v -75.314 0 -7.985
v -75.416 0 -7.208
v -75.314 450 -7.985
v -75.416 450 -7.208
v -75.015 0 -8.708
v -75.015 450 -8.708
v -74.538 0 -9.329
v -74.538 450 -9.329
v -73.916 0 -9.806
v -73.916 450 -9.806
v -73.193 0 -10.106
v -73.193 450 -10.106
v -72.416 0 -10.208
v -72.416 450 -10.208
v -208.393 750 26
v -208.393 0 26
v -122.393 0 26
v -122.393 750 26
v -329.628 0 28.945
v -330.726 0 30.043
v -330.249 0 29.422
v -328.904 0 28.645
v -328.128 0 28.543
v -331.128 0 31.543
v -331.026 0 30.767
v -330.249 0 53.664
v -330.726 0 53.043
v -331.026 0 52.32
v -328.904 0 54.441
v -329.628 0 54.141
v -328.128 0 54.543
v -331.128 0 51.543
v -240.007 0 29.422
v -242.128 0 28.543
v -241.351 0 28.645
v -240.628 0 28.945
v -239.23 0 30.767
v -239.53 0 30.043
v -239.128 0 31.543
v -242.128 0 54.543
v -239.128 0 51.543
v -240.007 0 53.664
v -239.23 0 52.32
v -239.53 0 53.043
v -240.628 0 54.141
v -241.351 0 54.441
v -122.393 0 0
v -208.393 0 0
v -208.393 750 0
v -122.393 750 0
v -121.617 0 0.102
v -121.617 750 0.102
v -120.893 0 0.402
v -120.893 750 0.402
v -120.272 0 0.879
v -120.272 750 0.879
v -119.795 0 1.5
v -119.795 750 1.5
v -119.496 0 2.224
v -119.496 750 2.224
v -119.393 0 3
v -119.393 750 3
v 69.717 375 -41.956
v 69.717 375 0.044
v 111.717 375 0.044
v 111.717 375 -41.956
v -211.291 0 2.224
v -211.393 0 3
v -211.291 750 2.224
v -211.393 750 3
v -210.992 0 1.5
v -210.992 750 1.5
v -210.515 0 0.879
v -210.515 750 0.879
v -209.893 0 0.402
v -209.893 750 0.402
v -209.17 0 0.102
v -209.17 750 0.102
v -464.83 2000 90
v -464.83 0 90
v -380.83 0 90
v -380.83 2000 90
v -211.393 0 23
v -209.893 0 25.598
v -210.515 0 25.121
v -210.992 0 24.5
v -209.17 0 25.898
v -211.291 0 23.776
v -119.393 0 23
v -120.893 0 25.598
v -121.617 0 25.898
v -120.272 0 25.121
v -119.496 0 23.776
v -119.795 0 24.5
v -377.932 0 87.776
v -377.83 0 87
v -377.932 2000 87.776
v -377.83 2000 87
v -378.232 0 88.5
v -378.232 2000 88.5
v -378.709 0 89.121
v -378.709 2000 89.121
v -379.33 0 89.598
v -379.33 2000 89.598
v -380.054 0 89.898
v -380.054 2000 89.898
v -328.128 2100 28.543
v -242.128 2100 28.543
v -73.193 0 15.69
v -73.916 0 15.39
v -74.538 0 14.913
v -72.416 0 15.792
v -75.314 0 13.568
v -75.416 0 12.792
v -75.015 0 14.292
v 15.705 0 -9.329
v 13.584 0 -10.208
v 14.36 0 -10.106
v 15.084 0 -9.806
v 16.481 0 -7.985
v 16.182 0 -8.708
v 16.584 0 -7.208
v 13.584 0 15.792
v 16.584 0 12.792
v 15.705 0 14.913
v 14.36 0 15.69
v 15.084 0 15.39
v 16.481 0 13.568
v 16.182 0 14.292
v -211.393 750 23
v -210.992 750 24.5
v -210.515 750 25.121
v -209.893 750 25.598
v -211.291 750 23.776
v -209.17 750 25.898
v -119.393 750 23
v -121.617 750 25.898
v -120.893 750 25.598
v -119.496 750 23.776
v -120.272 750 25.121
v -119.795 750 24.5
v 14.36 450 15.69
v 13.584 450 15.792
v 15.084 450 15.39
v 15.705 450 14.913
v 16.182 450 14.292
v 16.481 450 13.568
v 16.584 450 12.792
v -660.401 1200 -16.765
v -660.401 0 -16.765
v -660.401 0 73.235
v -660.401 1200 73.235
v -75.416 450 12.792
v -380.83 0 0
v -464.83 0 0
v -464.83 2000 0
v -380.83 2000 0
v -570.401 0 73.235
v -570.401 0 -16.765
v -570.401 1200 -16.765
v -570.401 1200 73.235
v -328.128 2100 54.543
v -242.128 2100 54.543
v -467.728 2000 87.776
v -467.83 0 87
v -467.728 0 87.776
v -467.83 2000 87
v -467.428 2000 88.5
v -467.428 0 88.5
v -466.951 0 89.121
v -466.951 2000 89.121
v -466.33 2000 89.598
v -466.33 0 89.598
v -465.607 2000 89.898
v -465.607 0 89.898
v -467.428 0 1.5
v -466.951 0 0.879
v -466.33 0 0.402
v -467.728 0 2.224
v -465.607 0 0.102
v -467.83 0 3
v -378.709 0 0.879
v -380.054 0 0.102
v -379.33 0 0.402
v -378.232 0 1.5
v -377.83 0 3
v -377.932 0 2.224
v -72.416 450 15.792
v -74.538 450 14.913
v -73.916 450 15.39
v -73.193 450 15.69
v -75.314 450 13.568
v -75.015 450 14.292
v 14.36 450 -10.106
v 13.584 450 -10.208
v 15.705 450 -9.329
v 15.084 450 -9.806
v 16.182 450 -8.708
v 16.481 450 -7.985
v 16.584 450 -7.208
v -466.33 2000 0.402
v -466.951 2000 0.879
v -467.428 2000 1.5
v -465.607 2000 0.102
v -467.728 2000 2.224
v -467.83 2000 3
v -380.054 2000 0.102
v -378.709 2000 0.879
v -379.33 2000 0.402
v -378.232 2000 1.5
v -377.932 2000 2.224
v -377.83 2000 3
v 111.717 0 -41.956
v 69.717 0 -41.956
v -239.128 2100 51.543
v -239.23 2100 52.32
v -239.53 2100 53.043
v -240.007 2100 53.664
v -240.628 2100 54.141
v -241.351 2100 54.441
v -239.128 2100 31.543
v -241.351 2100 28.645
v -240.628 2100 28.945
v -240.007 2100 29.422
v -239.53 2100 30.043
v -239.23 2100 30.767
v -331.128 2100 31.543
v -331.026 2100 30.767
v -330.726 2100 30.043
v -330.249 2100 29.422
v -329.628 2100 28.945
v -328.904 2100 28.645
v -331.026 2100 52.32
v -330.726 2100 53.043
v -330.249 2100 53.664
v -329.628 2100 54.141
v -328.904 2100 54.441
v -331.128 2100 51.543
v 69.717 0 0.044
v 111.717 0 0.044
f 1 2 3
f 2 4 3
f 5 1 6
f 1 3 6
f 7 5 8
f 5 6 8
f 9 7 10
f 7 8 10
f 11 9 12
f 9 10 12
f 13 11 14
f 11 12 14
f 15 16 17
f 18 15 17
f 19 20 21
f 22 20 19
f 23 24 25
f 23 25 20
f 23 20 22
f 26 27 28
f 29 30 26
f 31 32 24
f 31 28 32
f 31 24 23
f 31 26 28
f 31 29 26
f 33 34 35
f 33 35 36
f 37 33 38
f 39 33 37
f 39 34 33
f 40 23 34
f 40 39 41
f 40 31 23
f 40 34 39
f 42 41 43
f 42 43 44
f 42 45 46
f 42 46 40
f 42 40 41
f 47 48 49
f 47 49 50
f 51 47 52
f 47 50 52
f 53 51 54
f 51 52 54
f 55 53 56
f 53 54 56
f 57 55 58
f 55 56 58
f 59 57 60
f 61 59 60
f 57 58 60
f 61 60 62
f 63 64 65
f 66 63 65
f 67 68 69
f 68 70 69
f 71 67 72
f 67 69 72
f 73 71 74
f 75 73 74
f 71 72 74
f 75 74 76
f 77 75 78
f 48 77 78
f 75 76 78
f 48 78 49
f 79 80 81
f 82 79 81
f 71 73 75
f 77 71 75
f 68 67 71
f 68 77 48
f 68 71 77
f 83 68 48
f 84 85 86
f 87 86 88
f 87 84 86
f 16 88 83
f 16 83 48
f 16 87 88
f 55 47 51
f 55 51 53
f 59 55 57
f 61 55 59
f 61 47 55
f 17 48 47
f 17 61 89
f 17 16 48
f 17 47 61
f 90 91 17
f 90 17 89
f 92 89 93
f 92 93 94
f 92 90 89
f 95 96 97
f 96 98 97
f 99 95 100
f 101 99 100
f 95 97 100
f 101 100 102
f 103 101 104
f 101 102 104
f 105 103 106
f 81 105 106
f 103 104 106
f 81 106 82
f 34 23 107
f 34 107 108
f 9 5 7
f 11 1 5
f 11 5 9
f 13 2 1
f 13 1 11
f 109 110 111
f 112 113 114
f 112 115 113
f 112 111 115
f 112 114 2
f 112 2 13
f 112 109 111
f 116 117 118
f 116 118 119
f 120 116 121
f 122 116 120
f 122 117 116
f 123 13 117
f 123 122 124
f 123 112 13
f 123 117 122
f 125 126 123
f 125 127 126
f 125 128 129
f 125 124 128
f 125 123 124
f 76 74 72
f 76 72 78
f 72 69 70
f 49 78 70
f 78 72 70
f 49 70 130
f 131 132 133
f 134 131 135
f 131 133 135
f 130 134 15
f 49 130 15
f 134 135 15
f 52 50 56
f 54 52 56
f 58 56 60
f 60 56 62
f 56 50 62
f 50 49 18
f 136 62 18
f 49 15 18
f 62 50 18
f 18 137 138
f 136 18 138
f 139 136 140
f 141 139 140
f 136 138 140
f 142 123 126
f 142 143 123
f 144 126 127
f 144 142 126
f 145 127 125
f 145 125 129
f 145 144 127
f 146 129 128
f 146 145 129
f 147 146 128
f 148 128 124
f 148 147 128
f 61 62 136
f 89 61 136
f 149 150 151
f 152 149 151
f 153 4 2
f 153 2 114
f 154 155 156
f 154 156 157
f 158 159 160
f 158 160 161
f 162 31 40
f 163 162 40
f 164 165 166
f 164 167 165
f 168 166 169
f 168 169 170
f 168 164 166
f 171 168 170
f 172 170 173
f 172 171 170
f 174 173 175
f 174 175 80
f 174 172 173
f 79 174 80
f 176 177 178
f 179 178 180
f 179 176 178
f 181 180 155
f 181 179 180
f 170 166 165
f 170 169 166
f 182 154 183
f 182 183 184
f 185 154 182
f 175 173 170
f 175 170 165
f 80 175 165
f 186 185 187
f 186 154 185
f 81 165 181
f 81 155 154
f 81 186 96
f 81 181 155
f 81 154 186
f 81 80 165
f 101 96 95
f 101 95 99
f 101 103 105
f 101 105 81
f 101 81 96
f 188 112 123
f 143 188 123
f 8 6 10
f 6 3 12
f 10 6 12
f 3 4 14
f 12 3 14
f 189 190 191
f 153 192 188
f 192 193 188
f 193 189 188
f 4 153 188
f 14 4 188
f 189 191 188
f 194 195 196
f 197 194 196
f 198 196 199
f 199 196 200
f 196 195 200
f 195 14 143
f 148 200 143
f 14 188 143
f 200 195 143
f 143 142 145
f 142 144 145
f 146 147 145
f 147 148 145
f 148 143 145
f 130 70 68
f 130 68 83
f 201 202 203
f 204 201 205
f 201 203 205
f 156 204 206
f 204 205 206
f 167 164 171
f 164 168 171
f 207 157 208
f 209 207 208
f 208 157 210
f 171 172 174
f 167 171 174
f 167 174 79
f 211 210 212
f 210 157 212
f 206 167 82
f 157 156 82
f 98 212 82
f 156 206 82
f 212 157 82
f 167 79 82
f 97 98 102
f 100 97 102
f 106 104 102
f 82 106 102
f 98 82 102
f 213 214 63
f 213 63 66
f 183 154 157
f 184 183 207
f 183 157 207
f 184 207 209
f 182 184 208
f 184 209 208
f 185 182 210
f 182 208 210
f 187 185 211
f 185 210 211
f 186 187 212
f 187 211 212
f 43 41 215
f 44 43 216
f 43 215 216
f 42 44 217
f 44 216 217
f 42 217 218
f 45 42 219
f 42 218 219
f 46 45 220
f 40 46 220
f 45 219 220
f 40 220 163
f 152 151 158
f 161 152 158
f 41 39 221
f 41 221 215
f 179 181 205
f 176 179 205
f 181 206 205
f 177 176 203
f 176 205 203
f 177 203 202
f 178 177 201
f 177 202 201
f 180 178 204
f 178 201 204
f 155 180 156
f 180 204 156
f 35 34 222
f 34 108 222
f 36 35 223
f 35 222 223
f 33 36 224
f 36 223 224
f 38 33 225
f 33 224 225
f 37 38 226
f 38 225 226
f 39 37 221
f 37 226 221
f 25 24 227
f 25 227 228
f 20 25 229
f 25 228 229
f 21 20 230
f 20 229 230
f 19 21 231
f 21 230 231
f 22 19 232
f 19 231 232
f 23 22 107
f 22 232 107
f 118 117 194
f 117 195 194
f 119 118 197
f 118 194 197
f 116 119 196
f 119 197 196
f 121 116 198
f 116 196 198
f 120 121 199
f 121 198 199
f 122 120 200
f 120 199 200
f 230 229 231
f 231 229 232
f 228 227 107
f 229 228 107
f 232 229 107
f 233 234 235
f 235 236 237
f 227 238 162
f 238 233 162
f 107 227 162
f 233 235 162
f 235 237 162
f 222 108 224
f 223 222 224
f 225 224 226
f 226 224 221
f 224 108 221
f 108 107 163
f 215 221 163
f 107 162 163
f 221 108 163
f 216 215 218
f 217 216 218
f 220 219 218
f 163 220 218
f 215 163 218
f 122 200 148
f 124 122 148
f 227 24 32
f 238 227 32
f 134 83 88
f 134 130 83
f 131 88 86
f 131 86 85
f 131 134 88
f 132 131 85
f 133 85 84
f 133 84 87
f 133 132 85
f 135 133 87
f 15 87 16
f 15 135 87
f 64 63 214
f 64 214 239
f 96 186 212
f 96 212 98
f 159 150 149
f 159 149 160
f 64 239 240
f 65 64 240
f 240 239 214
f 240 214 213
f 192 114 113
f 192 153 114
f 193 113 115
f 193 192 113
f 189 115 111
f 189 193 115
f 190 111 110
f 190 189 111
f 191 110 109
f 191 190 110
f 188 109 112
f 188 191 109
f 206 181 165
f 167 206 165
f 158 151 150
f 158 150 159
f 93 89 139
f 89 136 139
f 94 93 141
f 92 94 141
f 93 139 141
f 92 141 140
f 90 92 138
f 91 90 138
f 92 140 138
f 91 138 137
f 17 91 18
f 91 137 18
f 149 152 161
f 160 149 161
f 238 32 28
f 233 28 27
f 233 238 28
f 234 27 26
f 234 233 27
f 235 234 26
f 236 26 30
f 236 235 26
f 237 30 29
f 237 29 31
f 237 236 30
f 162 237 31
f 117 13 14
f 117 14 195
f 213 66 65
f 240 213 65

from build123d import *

# Parameters (mm, degrees)
F0_W      = 92
F0_H      = 26
F1_DEPTH  = 450
F2_R      = 3
F3_R      = 3
F4_W      = 92
F4_H      = 26
F5_DEPTH  = 750
F6_R      = 3
F7_W      = 92
F7_H      = 26
F8_DEPTH  = 2100
F9_R      = 3
F10_W     = 42
F10_H     = 42
F11_DEPTH = 375
F12_W     = 90
F12_H     = 90
F13_DEPTH = 2000
F14_R     = 3
F15_W     = 90
F15_H     = 90
F16_DEPTH = 1200


with BuildPart() as f1:
    # F0 (on Front) → F1 (new body)
    with BuildSketch(Plane.XZ):
        with Locations((-29.416444, 2.791941)):
            Rectangle(F0_W, F0_H)
    extrude(amount=-F1_DEPTH)

    # F2
    f2_edges = [f1.edges().sort_by_distance(p)[0] for p in [
        (-75.416444, 225, 15.791941),
        (-75.416444, 225, -10.208059),
    ]]
    fillet(f2_edges, radius=F2_R)

    # F3
    f3_edges = [f1.edges().sort_by_distance(p)[0] for p in [
        (16.583556, 225, 15.791941),
        (16.583556, 225, -10.208059),
    ]]
    fillet(f3_edges, radius=F3_R)


with BuildPart() as f5:
    # F4 (on Front) → F5 (new body)
    with BuildSketch(Plane.XZ):
        with Locations((-165.393431, 13)):
            Rectangle(F4_W, F4_H)
    extrude(amount=-F5_DEPTH)

    # F6
    f6_edges = [f5.edges().sort_by_distance(p)[0] for p in [
        (-211.393431, 375, 26),
        (-119.393431, 375, 26),
        (-119.393431, 375, 0),
        (-211.393431, 375, 0),
    ]]
    fillet(f6_edges, radius=F6_R)


with BuildPart() as f8:
    # F7 (on Front) → F8 (new body)
    with BuildSketch(Plane.XZ):
        with Locations((-285.127858, 41.543171)):
            Rectangle(F7_W, F7_H)
    extrude(amount=-F8_DEPTH)

    # F9
    f9_edges = [f8.edges().sort_by_distance(p)[0] for p in [
        (-331.127858, 1050, 54.543171),
        (-239.127858, 1050, 54.543171),
        (-239.127858, 1050, 28.543171),
        (-331.127858, 1050, 28.543171),
    ]]
    fillet(f9_edges, radius=F9_R)


with BuildPart() as f11:
    # F10 (on Front) → F11 (new body)
    with BuildSketch(Plane.XZ):
        with Locations((90.716598, -20.95584)):
            Rectangle(F10_W, F10_H)
    extrude(amount=-F11_DEPTH)


with BuildPart() as f13:
    # F12 (on Front) → F13 (new body)
    with BuildSketch(Plane.XZ):
        with Locations((-422.830092, 45)):
            Rectangle(F12_W, F12_H)
    extrude(amount=-F13_DEPTH)

    # F14
    f14_edges = [f13.edges().sort_by_distance(p)[0] for p in [
        (-467.830092, 1000, 90),
        (-377.830092, 1000, 90),
        (-467.830092, 1000, 0),
        (-377.830092, 1000, 0),
    ]]
    fillet(f14_edges, radius=F14_R)


with BuildPart() as f16:
    # F15 (on Front) → F16 (new body)
    with BuildSketch(Plane.XZ):
        with Locations((-615.401251, 28.234882)):
            Rectangle(F15_W, F15_H)
    extrude(amount=-F16_DEPTH)


solid = Compound([f1.part, f5.part, f8.part, f11.part, f13.part, f16.part])
